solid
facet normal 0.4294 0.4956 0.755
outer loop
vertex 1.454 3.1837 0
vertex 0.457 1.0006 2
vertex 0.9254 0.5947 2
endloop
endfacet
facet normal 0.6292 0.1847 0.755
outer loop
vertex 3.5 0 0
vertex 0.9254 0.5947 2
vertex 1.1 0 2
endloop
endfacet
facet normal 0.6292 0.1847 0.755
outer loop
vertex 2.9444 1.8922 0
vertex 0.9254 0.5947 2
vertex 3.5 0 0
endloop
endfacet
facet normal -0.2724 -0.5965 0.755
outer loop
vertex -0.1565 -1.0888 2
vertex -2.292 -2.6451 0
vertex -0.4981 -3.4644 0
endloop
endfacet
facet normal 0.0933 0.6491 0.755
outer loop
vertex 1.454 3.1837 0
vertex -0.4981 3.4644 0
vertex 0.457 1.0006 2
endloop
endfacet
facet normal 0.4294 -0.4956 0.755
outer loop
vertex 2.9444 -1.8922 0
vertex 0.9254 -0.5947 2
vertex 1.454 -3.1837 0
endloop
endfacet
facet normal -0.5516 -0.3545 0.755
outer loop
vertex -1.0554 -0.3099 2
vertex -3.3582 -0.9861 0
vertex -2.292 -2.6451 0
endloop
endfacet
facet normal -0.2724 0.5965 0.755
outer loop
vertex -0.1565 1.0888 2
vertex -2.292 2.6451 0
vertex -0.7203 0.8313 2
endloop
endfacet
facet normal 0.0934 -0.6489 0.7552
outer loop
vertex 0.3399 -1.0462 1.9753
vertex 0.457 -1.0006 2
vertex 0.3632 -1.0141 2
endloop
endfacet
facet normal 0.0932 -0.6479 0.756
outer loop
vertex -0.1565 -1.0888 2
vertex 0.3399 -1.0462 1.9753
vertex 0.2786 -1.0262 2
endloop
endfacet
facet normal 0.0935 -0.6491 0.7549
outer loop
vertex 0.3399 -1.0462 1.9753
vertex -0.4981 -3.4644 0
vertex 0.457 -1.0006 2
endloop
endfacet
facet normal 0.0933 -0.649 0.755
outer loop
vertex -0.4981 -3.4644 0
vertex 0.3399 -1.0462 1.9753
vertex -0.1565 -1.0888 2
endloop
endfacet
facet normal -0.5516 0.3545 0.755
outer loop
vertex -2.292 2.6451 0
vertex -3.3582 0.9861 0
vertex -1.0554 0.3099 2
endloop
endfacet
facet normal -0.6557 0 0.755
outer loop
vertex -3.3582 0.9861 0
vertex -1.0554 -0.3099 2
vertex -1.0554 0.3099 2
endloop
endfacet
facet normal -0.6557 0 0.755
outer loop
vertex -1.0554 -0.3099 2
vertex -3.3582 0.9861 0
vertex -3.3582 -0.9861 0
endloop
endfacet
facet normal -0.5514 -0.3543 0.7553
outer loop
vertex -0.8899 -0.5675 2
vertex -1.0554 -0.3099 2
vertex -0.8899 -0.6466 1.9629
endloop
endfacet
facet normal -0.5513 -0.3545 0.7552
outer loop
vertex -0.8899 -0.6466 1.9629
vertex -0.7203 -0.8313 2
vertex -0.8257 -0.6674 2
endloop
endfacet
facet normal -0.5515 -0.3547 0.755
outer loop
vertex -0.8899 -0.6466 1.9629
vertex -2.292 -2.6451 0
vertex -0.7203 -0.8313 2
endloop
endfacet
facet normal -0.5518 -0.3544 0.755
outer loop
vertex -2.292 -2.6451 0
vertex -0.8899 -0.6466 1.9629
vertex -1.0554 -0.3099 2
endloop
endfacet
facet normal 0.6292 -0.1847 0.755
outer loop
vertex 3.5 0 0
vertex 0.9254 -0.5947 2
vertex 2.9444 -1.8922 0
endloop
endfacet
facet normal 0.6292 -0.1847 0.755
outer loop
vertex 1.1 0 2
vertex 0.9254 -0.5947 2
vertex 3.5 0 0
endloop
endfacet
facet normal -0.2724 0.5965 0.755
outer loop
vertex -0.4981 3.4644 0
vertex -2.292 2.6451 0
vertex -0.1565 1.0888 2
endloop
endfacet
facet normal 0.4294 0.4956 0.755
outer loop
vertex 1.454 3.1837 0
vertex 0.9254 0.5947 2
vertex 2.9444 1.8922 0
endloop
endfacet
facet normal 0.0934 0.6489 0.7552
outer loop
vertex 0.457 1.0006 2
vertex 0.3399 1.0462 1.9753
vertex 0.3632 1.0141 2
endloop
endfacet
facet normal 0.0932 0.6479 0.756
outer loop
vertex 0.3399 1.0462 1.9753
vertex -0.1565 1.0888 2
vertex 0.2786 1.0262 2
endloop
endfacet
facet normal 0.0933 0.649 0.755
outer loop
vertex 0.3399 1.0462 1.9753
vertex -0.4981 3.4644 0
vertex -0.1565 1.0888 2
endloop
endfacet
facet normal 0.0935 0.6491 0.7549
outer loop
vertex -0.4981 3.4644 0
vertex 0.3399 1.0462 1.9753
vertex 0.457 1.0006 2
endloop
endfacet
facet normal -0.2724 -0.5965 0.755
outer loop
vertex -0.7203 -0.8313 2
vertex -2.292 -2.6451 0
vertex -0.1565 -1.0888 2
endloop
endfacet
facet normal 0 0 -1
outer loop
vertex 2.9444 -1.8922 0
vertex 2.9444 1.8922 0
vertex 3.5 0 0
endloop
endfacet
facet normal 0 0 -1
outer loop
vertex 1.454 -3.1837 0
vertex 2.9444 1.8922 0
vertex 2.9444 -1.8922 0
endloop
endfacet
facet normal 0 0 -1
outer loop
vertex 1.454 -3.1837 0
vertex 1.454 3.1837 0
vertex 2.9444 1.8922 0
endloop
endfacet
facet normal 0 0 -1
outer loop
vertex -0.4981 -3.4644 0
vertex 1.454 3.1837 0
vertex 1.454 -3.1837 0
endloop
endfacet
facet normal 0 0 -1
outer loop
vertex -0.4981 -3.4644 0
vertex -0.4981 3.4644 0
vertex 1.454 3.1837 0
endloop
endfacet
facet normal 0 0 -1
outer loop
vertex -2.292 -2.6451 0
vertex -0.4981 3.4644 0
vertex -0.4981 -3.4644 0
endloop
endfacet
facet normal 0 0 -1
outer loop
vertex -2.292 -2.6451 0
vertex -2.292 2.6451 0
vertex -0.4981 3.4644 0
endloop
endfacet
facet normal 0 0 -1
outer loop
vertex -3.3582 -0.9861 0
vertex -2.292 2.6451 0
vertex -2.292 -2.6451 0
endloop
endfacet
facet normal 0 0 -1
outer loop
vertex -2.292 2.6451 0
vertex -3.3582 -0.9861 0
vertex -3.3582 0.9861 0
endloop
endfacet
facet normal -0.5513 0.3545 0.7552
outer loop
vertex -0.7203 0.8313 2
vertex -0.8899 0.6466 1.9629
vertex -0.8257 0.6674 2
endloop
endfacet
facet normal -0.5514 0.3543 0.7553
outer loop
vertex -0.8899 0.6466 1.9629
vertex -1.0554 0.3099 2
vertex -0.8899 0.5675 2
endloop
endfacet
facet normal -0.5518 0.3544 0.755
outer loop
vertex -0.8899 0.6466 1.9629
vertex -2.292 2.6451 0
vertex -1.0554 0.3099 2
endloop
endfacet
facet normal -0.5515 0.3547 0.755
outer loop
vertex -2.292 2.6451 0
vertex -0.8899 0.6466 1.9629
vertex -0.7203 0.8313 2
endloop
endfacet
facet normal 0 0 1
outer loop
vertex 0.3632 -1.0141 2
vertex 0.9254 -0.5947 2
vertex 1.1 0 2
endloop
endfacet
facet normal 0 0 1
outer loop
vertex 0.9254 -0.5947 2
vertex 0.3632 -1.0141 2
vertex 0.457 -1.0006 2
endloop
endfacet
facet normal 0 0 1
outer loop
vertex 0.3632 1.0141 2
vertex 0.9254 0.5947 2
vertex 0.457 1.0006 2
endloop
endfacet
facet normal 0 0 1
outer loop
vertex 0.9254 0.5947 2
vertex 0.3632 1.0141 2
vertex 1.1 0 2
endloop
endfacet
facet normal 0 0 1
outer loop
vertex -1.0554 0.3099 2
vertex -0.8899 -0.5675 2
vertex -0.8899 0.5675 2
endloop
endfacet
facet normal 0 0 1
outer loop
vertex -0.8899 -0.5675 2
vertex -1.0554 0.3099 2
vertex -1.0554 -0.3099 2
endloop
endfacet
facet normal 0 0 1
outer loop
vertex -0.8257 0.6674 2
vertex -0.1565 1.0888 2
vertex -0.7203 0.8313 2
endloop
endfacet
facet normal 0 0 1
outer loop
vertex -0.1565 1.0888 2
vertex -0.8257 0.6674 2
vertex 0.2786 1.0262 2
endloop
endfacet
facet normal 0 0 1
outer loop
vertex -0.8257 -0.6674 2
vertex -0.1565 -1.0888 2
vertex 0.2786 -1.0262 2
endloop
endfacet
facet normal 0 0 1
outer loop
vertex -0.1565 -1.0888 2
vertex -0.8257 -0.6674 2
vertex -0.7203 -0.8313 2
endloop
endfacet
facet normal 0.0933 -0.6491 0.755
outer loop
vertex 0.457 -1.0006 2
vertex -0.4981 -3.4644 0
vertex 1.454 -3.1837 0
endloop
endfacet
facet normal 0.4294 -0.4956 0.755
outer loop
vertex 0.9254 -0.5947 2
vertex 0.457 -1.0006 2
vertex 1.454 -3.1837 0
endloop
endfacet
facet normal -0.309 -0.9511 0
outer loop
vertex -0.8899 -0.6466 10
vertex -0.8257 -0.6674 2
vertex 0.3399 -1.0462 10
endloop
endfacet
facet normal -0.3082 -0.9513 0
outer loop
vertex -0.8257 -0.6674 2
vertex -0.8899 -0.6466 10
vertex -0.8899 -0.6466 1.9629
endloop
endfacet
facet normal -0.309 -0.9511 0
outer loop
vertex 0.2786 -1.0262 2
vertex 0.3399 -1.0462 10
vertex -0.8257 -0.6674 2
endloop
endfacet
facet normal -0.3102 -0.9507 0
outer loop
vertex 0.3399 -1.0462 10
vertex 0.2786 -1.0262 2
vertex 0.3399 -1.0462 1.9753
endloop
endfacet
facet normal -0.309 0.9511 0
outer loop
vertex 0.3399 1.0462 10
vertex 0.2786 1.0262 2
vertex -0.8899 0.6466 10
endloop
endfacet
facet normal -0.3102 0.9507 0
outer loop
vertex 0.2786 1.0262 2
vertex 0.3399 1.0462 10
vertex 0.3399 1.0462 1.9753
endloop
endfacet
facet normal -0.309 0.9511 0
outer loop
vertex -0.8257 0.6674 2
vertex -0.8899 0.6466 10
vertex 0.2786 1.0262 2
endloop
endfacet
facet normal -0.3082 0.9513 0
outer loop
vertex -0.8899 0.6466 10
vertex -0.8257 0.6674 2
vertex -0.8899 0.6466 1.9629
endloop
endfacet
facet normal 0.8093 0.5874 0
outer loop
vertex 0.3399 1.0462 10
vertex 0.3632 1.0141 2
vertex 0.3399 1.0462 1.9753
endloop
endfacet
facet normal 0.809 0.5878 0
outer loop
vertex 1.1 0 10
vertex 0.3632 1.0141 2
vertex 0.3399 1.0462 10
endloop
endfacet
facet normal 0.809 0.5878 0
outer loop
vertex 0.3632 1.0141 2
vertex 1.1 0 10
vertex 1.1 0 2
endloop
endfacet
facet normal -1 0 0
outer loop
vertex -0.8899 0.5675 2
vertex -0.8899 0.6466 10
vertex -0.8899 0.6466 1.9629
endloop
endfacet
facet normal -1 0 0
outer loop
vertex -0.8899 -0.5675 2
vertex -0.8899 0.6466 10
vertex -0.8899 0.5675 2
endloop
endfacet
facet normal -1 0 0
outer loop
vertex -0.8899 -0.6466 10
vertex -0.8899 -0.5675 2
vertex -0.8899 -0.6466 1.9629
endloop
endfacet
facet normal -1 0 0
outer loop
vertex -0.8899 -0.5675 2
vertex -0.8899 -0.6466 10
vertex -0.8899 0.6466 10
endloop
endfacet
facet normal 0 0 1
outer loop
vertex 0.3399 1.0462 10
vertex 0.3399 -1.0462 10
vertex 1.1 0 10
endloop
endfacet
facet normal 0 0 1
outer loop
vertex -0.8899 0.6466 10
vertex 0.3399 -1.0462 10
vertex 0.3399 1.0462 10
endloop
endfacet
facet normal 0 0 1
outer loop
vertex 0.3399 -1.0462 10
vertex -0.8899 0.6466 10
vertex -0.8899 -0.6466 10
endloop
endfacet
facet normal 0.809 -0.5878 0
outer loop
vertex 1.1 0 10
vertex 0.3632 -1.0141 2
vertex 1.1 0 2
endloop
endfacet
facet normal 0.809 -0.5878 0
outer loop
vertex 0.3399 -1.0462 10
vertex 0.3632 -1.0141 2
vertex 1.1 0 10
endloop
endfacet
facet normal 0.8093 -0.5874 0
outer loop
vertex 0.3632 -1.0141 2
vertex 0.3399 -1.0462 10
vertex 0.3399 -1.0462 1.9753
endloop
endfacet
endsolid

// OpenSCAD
module screwHole(length)
{

cylinder(h=2,r1=3.5,r2=1.1) ;
cylinder(h=length,r=1.1);
    
}


module screwingHole(length)
{

cylinder(h=length,r=1);
    
}

//$fn=30;
screwHole(10);
